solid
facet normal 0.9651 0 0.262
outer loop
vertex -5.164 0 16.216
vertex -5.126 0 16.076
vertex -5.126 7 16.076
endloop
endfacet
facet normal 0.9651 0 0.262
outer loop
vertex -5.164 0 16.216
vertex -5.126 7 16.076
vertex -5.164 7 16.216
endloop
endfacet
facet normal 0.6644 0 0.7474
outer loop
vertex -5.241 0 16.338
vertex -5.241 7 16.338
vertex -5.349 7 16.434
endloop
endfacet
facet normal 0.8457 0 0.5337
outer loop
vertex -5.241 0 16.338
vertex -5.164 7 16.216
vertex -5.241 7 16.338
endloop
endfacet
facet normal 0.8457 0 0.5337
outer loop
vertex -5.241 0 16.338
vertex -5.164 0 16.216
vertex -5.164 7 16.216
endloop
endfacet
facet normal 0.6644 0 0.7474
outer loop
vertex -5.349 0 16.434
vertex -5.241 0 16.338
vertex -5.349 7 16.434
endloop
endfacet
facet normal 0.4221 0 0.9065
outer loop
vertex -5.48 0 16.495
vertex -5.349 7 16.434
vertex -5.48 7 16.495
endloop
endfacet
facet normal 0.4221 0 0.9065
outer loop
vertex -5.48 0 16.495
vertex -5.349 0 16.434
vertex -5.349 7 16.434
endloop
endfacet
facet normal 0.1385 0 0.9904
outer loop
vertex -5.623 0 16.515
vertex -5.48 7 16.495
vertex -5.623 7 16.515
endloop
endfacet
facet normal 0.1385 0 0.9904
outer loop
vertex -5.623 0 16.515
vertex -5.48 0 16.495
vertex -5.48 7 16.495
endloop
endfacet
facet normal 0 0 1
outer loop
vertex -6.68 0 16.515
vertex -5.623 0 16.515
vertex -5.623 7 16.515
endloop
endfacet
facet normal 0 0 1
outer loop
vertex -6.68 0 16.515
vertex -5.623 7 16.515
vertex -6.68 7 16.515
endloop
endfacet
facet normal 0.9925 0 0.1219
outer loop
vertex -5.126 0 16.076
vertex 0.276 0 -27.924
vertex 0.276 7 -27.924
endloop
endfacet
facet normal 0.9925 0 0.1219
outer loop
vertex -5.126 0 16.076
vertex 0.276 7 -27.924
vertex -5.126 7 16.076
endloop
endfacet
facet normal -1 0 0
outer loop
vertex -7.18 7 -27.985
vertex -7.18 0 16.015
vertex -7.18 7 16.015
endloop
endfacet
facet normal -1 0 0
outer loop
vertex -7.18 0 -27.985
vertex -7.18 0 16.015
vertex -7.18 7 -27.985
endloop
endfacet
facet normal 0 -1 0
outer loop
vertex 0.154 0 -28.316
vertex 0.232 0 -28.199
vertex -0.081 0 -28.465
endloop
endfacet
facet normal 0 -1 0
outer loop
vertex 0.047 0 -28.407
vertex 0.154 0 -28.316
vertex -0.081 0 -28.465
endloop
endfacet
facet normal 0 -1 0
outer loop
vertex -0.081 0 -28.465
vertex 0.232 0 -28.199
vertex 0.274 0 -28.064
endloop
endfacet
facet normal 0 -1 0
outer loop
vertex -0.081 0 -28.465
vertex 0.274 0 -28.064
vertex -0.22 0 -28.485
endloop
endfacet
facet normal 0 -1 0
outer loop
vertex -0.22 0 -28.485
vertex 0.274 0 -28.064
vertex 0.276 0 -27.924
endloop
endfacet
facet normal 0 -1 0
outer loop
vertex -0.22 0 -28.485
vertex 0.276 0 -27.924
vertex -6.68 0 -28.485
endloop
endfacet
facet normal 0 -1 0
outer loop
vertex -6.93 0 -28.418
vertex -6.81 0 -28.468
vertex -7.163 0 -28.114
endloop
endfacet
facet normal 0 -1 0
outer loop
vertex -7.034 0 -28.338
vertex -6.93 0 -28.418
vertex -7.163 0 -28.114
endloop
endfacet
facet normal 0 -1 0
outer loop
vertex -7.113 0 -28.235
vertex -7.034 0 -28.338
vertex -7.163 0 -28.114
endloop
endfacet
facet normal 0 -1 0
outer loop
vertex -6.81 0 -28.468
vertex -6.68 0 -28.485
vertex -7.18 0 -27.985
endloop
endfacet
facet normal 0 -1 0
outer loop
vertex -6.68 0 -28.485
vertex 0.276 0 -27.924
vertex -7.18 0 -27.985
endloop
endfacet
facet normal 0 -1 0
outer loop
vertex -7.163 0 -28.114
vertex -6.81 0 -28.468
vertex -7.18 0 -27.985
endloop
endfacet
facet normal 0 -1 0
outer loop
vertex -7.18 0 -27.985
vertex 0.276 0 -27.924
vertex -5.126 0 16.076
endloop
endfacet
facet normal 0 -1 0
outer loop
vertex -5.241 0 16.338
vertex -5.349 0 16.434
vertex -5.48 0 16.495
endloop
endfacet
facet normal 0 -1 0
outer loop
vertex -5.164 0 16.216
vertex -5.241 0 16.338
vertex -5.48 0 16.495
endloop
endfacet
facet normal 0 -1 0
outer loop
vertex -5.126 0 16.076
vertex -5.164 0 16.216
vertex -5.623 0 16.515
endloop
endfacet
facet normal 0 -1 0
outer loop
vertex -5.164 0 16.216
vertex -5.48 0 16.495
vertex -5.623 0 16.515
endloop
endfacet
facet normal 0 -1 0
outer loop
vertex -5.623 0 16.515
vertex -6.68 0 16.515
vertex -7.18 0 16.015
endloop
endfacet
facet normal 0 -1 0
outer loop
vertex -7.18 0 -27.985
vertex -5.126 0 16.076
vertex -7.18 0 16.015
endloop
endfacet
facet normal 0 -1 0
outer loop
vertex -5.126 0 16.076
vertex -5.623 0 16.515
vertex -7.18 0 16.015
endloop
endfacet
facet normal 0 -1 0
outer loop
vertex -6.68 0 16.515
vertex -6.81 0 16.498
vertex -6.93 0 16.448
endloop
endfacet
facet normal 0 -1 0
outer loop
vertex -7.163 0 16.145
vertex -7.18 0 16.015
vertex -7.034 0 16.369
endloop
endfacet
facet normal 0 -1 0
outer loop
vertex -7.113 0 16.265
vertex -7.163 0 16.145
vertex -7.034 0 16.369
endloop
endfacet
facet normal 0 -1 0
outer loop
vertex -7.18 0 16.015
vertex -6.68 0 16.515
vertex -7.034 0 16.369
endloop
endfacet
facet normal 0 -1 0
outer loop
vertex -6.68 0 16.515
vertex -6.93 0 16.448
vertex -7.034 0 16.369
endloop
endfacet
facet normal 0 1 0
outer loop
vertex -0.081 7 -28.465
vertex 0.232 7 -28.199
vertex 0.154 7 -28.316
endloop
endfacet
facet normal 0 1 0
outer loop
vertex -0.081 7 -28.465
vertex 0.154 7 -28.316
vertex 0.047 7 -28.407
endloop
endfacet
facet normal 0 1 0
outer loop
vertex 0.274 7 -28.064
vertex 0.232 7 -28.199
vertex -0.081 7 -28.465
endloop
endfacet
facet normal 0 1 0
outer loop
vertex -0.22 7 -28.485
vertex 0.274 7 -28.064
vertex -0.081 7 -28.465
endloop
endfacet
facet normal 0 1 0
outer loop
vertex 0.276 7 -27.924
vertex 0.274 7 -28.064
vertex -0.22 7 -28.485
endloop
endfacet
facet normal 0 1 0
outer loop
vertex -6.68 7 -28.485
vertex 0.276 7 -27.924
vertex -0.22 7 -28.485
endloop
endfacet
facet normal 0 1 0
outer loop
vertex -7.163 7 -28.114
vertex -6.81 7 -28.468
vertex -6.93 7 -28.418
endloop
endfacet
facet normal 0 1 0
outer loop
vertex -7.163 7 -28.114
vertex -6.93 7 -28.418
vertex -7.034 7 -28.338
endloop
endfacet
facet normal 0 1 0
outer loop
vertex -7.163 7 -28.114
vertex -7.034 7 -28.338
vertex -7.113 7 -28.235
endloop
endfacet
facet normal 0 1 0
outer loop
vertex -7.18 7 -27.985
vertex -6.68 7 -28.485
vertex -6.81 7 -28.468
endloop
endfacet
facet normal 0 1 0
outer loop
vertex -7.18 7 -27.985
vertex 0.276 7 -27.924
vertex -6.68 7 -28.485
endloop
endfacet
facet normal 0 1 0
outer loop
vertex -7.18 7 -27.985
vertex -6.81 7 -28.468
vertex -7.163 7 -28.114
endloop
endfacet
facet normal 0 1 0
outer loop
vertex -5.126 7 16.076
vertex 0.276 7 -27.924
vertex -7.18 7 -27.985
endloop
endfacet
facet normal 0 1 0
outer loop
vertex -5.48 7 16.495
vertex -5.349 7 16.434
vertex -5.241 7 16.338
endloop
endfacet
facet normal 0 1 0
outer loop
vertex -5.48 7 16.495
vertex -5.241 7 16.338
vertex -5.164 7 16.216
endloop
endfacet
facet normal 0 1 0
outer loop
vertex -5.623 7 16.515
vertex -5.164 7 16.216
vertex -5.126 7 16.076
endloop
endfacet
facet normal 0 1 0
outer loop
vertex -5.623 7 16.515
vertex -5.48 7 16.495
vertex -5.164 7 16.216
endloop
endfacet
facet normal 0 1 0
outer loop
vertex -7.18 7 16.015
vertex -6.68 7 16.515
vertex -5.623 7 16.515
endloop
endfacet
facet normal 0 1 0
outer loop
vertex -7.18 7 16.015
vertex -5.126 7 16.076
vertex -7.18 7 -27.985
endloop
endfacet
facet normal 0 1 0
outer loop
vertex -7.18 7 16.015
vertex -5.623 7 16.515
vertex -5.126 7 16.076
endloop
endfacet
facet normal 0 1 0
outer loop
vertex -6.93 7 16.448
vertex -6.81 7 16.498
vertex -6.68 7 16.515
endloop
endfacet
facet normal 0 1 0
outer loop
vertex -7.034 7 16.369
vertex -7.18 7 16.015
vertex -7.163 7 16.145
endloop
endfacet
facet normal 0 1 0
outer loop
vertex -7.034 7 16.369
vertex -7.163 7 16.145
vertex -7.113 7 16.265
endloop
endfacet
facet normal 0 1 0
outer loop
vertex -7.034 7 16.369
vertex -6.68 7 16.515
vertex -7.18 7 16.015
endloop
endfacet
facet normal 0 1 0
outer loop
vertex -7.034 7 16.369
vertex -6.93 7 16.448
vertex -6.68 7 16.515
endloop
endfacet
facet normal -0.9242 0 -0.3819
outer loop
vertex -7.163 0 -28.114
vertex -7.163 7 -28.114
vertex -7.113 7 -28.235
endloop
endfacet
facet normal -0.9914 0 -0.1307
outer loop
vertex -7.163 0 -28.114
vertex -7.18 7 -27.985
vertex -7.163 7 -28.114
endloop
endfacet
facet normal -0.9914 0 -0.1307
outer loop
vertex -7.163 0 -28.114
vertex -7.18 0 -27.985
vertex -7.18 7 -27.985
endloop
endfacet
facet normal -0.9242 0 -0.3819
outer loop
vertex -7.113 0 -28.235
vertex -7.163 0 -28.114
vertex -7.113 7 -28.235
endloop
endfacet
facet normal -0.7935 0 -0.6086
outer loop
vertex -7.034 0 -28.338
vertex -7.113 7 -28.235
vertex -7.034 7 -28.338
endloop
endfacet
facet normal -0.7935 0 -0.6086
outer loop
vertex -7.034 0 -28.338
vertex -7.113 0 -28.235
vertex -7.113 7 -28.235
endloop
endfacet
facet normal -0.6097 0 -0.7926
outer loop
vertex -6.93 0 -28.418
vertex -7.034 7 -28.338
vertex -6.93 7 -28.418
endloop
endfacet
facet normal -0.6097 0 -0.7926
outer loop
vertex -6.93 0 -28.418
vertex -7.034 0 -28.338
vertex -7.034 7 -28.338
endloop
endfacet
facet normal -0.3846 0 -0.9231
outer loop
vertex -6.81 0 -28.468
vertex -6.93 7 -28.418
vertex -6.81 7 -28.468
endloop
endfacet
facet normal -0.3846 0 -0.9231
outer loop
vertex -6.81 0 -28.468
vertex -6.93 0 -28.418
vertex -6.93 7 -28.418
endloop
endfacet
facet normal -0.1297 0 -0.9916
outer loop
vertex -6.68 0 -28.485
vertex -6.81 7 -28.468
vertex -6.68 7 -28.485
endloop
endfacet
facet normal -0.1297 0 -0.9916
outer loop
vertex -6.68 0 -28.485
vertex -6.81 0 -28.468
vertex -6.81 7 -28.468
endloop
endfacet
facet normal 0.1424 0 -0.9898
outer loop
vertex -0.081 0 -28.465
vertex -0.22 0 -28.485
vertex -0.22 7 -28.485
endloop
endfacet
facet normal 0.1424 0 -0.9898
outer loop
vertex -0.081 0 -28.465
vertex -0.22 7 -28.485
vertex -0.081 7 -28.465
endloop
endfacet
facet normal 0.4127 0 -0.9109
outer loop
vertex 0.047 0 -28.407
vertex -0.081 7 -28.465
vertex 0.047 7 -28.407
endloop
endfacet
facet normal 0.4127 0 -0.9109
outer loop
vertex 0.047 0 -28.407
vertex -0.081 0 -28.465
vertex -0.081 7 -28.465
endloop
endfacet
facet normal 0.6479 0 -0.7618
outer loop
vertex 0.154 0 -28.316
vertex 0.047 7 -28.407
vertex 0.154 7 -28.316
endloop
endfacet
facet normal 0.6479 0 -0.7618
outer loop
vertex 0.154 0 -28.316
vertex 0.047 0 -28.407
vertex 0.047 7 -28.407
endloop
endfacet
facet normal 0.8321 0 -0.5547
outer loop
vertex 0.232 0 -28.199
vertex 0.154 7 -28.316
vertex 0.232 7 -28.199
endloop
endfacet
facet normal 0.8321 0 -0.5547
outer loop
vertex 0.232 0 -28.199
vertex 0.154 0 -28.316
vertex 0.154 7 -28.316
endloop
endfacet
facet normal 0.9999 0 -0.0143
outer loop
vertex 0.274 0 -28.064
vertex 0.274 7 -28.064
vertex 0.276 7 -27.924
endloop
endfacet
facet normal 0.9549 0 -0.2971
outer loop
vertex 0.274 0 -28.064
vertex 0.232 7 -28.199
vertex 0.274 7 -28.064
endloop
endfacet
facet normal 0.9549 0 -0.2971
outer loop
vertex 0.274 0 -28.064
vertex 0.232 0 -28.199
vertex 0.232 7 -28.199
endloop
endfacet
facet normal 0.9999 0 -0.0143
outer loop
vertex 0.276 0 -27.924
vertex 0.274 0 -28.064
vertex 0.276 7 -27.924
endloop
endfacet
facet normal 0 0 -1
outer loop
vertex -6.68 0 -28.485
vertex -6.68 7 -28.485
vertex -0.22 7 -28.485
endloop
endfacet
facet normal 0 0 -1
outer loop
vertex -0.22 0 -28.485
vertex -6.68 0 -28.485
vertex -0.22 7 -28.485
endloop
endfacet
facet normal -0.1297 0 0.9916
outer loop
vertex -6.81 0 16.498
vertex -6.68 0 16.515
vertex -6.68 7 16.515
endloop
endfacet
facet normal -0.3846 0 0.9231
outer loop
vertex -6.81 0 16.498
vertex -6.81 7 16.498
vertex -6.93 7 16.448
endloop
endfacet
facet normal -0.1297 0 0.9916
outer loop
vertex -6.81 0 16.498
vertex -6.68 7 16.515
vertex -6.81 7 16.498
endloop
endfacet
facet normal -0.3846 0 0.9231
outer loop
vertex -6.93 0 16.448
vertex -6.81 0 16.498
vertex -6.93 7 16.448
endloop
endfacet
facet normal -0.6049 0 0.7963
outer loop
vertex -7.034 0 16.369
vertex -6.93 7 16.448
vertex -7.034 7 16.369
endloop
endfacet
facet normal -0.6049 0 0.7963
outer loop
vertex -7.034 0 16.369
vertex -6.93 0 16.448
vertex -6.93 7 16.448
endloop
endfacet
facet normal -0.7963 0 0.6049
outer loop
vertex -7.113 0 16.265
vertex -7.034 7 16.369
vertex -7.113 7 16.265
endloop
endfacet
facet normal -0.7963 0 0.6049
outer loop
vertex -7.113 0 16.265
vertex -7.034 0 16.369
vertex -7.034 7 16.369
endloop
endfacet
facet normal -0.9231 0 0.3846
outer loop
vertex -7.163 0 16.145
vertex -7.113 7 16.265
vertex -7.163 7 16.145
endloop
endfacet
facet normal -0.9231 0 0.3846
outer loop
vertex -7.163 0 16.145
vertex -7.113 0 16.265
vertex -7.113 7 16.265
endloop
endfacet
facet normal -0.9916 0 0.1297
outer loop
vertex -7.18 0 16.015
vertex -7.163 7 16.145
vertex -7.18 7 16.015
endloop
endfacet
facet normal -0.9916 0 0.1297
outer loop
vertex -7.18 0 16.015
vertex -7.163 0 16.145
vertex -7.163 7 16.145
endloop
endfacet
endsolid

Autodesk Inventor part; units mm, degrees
ref_plane "YZ Plane" through (0, 0, 0) normal (1, 0, 0) x (0, 1, 0)
ref_plane "XZ Plane" through (0, 0, 0) normal (0, 1, 0) x (-1, 0, 0)
ref_plane "XY Plane" through (0, 0, 0) normal (0, 0, 1) x (1, 0, 0)
sketch "Sketch1" plane through (0, 0, 0) normal (0, 1, 0) x (-1, 0, 0)
  line L0 (7.1803, 16.0154) -> (7.1803, -27.9846)
  line L1 (6.6803, -28.4846) -> (0.2201, -28.4846)
  line L2 (-0.2762, -27.9236) -> (5.1264, 16.0764)
  line L3 (5.6226, 16.5154) -> (6.6803, 16.5154)
  arc A0 (6.6803, -28.4846) -> (7.1803, -27.9846) centre (6.6803, -27.9846) ccw
  arc A1 (-0.2762, -27.9236) -> (0.2201, -28.4846) centre (0.2201, -27.9846) ccw
  arc A2 (7.1803, 16.0154) -> (6.6803, 16.5154) centre (6.6803, 16.0154) ccw
  arc A3 (5.6226, 16.5154) -> (5.1264, 16.0764) centre (5.6226, 16.0154) ccw
  point P0 (0, 0)
  point P1 (7.1803, 16.5154)
  point P2 (7.1803, -28.4846)
  point P3 (5.1803, 16.5154)
  dimension "d0" = 45
  dimension "d1" = 7
  dimension "d2" = 2
  dimension "d3" = 0.5
  dimension "d4" = 0.5
  dimension "d5" = 0.5
extrude "Extrusion1" add sketch "Sketch1" along normal blind 7
properties part number "Wedge - V2"
